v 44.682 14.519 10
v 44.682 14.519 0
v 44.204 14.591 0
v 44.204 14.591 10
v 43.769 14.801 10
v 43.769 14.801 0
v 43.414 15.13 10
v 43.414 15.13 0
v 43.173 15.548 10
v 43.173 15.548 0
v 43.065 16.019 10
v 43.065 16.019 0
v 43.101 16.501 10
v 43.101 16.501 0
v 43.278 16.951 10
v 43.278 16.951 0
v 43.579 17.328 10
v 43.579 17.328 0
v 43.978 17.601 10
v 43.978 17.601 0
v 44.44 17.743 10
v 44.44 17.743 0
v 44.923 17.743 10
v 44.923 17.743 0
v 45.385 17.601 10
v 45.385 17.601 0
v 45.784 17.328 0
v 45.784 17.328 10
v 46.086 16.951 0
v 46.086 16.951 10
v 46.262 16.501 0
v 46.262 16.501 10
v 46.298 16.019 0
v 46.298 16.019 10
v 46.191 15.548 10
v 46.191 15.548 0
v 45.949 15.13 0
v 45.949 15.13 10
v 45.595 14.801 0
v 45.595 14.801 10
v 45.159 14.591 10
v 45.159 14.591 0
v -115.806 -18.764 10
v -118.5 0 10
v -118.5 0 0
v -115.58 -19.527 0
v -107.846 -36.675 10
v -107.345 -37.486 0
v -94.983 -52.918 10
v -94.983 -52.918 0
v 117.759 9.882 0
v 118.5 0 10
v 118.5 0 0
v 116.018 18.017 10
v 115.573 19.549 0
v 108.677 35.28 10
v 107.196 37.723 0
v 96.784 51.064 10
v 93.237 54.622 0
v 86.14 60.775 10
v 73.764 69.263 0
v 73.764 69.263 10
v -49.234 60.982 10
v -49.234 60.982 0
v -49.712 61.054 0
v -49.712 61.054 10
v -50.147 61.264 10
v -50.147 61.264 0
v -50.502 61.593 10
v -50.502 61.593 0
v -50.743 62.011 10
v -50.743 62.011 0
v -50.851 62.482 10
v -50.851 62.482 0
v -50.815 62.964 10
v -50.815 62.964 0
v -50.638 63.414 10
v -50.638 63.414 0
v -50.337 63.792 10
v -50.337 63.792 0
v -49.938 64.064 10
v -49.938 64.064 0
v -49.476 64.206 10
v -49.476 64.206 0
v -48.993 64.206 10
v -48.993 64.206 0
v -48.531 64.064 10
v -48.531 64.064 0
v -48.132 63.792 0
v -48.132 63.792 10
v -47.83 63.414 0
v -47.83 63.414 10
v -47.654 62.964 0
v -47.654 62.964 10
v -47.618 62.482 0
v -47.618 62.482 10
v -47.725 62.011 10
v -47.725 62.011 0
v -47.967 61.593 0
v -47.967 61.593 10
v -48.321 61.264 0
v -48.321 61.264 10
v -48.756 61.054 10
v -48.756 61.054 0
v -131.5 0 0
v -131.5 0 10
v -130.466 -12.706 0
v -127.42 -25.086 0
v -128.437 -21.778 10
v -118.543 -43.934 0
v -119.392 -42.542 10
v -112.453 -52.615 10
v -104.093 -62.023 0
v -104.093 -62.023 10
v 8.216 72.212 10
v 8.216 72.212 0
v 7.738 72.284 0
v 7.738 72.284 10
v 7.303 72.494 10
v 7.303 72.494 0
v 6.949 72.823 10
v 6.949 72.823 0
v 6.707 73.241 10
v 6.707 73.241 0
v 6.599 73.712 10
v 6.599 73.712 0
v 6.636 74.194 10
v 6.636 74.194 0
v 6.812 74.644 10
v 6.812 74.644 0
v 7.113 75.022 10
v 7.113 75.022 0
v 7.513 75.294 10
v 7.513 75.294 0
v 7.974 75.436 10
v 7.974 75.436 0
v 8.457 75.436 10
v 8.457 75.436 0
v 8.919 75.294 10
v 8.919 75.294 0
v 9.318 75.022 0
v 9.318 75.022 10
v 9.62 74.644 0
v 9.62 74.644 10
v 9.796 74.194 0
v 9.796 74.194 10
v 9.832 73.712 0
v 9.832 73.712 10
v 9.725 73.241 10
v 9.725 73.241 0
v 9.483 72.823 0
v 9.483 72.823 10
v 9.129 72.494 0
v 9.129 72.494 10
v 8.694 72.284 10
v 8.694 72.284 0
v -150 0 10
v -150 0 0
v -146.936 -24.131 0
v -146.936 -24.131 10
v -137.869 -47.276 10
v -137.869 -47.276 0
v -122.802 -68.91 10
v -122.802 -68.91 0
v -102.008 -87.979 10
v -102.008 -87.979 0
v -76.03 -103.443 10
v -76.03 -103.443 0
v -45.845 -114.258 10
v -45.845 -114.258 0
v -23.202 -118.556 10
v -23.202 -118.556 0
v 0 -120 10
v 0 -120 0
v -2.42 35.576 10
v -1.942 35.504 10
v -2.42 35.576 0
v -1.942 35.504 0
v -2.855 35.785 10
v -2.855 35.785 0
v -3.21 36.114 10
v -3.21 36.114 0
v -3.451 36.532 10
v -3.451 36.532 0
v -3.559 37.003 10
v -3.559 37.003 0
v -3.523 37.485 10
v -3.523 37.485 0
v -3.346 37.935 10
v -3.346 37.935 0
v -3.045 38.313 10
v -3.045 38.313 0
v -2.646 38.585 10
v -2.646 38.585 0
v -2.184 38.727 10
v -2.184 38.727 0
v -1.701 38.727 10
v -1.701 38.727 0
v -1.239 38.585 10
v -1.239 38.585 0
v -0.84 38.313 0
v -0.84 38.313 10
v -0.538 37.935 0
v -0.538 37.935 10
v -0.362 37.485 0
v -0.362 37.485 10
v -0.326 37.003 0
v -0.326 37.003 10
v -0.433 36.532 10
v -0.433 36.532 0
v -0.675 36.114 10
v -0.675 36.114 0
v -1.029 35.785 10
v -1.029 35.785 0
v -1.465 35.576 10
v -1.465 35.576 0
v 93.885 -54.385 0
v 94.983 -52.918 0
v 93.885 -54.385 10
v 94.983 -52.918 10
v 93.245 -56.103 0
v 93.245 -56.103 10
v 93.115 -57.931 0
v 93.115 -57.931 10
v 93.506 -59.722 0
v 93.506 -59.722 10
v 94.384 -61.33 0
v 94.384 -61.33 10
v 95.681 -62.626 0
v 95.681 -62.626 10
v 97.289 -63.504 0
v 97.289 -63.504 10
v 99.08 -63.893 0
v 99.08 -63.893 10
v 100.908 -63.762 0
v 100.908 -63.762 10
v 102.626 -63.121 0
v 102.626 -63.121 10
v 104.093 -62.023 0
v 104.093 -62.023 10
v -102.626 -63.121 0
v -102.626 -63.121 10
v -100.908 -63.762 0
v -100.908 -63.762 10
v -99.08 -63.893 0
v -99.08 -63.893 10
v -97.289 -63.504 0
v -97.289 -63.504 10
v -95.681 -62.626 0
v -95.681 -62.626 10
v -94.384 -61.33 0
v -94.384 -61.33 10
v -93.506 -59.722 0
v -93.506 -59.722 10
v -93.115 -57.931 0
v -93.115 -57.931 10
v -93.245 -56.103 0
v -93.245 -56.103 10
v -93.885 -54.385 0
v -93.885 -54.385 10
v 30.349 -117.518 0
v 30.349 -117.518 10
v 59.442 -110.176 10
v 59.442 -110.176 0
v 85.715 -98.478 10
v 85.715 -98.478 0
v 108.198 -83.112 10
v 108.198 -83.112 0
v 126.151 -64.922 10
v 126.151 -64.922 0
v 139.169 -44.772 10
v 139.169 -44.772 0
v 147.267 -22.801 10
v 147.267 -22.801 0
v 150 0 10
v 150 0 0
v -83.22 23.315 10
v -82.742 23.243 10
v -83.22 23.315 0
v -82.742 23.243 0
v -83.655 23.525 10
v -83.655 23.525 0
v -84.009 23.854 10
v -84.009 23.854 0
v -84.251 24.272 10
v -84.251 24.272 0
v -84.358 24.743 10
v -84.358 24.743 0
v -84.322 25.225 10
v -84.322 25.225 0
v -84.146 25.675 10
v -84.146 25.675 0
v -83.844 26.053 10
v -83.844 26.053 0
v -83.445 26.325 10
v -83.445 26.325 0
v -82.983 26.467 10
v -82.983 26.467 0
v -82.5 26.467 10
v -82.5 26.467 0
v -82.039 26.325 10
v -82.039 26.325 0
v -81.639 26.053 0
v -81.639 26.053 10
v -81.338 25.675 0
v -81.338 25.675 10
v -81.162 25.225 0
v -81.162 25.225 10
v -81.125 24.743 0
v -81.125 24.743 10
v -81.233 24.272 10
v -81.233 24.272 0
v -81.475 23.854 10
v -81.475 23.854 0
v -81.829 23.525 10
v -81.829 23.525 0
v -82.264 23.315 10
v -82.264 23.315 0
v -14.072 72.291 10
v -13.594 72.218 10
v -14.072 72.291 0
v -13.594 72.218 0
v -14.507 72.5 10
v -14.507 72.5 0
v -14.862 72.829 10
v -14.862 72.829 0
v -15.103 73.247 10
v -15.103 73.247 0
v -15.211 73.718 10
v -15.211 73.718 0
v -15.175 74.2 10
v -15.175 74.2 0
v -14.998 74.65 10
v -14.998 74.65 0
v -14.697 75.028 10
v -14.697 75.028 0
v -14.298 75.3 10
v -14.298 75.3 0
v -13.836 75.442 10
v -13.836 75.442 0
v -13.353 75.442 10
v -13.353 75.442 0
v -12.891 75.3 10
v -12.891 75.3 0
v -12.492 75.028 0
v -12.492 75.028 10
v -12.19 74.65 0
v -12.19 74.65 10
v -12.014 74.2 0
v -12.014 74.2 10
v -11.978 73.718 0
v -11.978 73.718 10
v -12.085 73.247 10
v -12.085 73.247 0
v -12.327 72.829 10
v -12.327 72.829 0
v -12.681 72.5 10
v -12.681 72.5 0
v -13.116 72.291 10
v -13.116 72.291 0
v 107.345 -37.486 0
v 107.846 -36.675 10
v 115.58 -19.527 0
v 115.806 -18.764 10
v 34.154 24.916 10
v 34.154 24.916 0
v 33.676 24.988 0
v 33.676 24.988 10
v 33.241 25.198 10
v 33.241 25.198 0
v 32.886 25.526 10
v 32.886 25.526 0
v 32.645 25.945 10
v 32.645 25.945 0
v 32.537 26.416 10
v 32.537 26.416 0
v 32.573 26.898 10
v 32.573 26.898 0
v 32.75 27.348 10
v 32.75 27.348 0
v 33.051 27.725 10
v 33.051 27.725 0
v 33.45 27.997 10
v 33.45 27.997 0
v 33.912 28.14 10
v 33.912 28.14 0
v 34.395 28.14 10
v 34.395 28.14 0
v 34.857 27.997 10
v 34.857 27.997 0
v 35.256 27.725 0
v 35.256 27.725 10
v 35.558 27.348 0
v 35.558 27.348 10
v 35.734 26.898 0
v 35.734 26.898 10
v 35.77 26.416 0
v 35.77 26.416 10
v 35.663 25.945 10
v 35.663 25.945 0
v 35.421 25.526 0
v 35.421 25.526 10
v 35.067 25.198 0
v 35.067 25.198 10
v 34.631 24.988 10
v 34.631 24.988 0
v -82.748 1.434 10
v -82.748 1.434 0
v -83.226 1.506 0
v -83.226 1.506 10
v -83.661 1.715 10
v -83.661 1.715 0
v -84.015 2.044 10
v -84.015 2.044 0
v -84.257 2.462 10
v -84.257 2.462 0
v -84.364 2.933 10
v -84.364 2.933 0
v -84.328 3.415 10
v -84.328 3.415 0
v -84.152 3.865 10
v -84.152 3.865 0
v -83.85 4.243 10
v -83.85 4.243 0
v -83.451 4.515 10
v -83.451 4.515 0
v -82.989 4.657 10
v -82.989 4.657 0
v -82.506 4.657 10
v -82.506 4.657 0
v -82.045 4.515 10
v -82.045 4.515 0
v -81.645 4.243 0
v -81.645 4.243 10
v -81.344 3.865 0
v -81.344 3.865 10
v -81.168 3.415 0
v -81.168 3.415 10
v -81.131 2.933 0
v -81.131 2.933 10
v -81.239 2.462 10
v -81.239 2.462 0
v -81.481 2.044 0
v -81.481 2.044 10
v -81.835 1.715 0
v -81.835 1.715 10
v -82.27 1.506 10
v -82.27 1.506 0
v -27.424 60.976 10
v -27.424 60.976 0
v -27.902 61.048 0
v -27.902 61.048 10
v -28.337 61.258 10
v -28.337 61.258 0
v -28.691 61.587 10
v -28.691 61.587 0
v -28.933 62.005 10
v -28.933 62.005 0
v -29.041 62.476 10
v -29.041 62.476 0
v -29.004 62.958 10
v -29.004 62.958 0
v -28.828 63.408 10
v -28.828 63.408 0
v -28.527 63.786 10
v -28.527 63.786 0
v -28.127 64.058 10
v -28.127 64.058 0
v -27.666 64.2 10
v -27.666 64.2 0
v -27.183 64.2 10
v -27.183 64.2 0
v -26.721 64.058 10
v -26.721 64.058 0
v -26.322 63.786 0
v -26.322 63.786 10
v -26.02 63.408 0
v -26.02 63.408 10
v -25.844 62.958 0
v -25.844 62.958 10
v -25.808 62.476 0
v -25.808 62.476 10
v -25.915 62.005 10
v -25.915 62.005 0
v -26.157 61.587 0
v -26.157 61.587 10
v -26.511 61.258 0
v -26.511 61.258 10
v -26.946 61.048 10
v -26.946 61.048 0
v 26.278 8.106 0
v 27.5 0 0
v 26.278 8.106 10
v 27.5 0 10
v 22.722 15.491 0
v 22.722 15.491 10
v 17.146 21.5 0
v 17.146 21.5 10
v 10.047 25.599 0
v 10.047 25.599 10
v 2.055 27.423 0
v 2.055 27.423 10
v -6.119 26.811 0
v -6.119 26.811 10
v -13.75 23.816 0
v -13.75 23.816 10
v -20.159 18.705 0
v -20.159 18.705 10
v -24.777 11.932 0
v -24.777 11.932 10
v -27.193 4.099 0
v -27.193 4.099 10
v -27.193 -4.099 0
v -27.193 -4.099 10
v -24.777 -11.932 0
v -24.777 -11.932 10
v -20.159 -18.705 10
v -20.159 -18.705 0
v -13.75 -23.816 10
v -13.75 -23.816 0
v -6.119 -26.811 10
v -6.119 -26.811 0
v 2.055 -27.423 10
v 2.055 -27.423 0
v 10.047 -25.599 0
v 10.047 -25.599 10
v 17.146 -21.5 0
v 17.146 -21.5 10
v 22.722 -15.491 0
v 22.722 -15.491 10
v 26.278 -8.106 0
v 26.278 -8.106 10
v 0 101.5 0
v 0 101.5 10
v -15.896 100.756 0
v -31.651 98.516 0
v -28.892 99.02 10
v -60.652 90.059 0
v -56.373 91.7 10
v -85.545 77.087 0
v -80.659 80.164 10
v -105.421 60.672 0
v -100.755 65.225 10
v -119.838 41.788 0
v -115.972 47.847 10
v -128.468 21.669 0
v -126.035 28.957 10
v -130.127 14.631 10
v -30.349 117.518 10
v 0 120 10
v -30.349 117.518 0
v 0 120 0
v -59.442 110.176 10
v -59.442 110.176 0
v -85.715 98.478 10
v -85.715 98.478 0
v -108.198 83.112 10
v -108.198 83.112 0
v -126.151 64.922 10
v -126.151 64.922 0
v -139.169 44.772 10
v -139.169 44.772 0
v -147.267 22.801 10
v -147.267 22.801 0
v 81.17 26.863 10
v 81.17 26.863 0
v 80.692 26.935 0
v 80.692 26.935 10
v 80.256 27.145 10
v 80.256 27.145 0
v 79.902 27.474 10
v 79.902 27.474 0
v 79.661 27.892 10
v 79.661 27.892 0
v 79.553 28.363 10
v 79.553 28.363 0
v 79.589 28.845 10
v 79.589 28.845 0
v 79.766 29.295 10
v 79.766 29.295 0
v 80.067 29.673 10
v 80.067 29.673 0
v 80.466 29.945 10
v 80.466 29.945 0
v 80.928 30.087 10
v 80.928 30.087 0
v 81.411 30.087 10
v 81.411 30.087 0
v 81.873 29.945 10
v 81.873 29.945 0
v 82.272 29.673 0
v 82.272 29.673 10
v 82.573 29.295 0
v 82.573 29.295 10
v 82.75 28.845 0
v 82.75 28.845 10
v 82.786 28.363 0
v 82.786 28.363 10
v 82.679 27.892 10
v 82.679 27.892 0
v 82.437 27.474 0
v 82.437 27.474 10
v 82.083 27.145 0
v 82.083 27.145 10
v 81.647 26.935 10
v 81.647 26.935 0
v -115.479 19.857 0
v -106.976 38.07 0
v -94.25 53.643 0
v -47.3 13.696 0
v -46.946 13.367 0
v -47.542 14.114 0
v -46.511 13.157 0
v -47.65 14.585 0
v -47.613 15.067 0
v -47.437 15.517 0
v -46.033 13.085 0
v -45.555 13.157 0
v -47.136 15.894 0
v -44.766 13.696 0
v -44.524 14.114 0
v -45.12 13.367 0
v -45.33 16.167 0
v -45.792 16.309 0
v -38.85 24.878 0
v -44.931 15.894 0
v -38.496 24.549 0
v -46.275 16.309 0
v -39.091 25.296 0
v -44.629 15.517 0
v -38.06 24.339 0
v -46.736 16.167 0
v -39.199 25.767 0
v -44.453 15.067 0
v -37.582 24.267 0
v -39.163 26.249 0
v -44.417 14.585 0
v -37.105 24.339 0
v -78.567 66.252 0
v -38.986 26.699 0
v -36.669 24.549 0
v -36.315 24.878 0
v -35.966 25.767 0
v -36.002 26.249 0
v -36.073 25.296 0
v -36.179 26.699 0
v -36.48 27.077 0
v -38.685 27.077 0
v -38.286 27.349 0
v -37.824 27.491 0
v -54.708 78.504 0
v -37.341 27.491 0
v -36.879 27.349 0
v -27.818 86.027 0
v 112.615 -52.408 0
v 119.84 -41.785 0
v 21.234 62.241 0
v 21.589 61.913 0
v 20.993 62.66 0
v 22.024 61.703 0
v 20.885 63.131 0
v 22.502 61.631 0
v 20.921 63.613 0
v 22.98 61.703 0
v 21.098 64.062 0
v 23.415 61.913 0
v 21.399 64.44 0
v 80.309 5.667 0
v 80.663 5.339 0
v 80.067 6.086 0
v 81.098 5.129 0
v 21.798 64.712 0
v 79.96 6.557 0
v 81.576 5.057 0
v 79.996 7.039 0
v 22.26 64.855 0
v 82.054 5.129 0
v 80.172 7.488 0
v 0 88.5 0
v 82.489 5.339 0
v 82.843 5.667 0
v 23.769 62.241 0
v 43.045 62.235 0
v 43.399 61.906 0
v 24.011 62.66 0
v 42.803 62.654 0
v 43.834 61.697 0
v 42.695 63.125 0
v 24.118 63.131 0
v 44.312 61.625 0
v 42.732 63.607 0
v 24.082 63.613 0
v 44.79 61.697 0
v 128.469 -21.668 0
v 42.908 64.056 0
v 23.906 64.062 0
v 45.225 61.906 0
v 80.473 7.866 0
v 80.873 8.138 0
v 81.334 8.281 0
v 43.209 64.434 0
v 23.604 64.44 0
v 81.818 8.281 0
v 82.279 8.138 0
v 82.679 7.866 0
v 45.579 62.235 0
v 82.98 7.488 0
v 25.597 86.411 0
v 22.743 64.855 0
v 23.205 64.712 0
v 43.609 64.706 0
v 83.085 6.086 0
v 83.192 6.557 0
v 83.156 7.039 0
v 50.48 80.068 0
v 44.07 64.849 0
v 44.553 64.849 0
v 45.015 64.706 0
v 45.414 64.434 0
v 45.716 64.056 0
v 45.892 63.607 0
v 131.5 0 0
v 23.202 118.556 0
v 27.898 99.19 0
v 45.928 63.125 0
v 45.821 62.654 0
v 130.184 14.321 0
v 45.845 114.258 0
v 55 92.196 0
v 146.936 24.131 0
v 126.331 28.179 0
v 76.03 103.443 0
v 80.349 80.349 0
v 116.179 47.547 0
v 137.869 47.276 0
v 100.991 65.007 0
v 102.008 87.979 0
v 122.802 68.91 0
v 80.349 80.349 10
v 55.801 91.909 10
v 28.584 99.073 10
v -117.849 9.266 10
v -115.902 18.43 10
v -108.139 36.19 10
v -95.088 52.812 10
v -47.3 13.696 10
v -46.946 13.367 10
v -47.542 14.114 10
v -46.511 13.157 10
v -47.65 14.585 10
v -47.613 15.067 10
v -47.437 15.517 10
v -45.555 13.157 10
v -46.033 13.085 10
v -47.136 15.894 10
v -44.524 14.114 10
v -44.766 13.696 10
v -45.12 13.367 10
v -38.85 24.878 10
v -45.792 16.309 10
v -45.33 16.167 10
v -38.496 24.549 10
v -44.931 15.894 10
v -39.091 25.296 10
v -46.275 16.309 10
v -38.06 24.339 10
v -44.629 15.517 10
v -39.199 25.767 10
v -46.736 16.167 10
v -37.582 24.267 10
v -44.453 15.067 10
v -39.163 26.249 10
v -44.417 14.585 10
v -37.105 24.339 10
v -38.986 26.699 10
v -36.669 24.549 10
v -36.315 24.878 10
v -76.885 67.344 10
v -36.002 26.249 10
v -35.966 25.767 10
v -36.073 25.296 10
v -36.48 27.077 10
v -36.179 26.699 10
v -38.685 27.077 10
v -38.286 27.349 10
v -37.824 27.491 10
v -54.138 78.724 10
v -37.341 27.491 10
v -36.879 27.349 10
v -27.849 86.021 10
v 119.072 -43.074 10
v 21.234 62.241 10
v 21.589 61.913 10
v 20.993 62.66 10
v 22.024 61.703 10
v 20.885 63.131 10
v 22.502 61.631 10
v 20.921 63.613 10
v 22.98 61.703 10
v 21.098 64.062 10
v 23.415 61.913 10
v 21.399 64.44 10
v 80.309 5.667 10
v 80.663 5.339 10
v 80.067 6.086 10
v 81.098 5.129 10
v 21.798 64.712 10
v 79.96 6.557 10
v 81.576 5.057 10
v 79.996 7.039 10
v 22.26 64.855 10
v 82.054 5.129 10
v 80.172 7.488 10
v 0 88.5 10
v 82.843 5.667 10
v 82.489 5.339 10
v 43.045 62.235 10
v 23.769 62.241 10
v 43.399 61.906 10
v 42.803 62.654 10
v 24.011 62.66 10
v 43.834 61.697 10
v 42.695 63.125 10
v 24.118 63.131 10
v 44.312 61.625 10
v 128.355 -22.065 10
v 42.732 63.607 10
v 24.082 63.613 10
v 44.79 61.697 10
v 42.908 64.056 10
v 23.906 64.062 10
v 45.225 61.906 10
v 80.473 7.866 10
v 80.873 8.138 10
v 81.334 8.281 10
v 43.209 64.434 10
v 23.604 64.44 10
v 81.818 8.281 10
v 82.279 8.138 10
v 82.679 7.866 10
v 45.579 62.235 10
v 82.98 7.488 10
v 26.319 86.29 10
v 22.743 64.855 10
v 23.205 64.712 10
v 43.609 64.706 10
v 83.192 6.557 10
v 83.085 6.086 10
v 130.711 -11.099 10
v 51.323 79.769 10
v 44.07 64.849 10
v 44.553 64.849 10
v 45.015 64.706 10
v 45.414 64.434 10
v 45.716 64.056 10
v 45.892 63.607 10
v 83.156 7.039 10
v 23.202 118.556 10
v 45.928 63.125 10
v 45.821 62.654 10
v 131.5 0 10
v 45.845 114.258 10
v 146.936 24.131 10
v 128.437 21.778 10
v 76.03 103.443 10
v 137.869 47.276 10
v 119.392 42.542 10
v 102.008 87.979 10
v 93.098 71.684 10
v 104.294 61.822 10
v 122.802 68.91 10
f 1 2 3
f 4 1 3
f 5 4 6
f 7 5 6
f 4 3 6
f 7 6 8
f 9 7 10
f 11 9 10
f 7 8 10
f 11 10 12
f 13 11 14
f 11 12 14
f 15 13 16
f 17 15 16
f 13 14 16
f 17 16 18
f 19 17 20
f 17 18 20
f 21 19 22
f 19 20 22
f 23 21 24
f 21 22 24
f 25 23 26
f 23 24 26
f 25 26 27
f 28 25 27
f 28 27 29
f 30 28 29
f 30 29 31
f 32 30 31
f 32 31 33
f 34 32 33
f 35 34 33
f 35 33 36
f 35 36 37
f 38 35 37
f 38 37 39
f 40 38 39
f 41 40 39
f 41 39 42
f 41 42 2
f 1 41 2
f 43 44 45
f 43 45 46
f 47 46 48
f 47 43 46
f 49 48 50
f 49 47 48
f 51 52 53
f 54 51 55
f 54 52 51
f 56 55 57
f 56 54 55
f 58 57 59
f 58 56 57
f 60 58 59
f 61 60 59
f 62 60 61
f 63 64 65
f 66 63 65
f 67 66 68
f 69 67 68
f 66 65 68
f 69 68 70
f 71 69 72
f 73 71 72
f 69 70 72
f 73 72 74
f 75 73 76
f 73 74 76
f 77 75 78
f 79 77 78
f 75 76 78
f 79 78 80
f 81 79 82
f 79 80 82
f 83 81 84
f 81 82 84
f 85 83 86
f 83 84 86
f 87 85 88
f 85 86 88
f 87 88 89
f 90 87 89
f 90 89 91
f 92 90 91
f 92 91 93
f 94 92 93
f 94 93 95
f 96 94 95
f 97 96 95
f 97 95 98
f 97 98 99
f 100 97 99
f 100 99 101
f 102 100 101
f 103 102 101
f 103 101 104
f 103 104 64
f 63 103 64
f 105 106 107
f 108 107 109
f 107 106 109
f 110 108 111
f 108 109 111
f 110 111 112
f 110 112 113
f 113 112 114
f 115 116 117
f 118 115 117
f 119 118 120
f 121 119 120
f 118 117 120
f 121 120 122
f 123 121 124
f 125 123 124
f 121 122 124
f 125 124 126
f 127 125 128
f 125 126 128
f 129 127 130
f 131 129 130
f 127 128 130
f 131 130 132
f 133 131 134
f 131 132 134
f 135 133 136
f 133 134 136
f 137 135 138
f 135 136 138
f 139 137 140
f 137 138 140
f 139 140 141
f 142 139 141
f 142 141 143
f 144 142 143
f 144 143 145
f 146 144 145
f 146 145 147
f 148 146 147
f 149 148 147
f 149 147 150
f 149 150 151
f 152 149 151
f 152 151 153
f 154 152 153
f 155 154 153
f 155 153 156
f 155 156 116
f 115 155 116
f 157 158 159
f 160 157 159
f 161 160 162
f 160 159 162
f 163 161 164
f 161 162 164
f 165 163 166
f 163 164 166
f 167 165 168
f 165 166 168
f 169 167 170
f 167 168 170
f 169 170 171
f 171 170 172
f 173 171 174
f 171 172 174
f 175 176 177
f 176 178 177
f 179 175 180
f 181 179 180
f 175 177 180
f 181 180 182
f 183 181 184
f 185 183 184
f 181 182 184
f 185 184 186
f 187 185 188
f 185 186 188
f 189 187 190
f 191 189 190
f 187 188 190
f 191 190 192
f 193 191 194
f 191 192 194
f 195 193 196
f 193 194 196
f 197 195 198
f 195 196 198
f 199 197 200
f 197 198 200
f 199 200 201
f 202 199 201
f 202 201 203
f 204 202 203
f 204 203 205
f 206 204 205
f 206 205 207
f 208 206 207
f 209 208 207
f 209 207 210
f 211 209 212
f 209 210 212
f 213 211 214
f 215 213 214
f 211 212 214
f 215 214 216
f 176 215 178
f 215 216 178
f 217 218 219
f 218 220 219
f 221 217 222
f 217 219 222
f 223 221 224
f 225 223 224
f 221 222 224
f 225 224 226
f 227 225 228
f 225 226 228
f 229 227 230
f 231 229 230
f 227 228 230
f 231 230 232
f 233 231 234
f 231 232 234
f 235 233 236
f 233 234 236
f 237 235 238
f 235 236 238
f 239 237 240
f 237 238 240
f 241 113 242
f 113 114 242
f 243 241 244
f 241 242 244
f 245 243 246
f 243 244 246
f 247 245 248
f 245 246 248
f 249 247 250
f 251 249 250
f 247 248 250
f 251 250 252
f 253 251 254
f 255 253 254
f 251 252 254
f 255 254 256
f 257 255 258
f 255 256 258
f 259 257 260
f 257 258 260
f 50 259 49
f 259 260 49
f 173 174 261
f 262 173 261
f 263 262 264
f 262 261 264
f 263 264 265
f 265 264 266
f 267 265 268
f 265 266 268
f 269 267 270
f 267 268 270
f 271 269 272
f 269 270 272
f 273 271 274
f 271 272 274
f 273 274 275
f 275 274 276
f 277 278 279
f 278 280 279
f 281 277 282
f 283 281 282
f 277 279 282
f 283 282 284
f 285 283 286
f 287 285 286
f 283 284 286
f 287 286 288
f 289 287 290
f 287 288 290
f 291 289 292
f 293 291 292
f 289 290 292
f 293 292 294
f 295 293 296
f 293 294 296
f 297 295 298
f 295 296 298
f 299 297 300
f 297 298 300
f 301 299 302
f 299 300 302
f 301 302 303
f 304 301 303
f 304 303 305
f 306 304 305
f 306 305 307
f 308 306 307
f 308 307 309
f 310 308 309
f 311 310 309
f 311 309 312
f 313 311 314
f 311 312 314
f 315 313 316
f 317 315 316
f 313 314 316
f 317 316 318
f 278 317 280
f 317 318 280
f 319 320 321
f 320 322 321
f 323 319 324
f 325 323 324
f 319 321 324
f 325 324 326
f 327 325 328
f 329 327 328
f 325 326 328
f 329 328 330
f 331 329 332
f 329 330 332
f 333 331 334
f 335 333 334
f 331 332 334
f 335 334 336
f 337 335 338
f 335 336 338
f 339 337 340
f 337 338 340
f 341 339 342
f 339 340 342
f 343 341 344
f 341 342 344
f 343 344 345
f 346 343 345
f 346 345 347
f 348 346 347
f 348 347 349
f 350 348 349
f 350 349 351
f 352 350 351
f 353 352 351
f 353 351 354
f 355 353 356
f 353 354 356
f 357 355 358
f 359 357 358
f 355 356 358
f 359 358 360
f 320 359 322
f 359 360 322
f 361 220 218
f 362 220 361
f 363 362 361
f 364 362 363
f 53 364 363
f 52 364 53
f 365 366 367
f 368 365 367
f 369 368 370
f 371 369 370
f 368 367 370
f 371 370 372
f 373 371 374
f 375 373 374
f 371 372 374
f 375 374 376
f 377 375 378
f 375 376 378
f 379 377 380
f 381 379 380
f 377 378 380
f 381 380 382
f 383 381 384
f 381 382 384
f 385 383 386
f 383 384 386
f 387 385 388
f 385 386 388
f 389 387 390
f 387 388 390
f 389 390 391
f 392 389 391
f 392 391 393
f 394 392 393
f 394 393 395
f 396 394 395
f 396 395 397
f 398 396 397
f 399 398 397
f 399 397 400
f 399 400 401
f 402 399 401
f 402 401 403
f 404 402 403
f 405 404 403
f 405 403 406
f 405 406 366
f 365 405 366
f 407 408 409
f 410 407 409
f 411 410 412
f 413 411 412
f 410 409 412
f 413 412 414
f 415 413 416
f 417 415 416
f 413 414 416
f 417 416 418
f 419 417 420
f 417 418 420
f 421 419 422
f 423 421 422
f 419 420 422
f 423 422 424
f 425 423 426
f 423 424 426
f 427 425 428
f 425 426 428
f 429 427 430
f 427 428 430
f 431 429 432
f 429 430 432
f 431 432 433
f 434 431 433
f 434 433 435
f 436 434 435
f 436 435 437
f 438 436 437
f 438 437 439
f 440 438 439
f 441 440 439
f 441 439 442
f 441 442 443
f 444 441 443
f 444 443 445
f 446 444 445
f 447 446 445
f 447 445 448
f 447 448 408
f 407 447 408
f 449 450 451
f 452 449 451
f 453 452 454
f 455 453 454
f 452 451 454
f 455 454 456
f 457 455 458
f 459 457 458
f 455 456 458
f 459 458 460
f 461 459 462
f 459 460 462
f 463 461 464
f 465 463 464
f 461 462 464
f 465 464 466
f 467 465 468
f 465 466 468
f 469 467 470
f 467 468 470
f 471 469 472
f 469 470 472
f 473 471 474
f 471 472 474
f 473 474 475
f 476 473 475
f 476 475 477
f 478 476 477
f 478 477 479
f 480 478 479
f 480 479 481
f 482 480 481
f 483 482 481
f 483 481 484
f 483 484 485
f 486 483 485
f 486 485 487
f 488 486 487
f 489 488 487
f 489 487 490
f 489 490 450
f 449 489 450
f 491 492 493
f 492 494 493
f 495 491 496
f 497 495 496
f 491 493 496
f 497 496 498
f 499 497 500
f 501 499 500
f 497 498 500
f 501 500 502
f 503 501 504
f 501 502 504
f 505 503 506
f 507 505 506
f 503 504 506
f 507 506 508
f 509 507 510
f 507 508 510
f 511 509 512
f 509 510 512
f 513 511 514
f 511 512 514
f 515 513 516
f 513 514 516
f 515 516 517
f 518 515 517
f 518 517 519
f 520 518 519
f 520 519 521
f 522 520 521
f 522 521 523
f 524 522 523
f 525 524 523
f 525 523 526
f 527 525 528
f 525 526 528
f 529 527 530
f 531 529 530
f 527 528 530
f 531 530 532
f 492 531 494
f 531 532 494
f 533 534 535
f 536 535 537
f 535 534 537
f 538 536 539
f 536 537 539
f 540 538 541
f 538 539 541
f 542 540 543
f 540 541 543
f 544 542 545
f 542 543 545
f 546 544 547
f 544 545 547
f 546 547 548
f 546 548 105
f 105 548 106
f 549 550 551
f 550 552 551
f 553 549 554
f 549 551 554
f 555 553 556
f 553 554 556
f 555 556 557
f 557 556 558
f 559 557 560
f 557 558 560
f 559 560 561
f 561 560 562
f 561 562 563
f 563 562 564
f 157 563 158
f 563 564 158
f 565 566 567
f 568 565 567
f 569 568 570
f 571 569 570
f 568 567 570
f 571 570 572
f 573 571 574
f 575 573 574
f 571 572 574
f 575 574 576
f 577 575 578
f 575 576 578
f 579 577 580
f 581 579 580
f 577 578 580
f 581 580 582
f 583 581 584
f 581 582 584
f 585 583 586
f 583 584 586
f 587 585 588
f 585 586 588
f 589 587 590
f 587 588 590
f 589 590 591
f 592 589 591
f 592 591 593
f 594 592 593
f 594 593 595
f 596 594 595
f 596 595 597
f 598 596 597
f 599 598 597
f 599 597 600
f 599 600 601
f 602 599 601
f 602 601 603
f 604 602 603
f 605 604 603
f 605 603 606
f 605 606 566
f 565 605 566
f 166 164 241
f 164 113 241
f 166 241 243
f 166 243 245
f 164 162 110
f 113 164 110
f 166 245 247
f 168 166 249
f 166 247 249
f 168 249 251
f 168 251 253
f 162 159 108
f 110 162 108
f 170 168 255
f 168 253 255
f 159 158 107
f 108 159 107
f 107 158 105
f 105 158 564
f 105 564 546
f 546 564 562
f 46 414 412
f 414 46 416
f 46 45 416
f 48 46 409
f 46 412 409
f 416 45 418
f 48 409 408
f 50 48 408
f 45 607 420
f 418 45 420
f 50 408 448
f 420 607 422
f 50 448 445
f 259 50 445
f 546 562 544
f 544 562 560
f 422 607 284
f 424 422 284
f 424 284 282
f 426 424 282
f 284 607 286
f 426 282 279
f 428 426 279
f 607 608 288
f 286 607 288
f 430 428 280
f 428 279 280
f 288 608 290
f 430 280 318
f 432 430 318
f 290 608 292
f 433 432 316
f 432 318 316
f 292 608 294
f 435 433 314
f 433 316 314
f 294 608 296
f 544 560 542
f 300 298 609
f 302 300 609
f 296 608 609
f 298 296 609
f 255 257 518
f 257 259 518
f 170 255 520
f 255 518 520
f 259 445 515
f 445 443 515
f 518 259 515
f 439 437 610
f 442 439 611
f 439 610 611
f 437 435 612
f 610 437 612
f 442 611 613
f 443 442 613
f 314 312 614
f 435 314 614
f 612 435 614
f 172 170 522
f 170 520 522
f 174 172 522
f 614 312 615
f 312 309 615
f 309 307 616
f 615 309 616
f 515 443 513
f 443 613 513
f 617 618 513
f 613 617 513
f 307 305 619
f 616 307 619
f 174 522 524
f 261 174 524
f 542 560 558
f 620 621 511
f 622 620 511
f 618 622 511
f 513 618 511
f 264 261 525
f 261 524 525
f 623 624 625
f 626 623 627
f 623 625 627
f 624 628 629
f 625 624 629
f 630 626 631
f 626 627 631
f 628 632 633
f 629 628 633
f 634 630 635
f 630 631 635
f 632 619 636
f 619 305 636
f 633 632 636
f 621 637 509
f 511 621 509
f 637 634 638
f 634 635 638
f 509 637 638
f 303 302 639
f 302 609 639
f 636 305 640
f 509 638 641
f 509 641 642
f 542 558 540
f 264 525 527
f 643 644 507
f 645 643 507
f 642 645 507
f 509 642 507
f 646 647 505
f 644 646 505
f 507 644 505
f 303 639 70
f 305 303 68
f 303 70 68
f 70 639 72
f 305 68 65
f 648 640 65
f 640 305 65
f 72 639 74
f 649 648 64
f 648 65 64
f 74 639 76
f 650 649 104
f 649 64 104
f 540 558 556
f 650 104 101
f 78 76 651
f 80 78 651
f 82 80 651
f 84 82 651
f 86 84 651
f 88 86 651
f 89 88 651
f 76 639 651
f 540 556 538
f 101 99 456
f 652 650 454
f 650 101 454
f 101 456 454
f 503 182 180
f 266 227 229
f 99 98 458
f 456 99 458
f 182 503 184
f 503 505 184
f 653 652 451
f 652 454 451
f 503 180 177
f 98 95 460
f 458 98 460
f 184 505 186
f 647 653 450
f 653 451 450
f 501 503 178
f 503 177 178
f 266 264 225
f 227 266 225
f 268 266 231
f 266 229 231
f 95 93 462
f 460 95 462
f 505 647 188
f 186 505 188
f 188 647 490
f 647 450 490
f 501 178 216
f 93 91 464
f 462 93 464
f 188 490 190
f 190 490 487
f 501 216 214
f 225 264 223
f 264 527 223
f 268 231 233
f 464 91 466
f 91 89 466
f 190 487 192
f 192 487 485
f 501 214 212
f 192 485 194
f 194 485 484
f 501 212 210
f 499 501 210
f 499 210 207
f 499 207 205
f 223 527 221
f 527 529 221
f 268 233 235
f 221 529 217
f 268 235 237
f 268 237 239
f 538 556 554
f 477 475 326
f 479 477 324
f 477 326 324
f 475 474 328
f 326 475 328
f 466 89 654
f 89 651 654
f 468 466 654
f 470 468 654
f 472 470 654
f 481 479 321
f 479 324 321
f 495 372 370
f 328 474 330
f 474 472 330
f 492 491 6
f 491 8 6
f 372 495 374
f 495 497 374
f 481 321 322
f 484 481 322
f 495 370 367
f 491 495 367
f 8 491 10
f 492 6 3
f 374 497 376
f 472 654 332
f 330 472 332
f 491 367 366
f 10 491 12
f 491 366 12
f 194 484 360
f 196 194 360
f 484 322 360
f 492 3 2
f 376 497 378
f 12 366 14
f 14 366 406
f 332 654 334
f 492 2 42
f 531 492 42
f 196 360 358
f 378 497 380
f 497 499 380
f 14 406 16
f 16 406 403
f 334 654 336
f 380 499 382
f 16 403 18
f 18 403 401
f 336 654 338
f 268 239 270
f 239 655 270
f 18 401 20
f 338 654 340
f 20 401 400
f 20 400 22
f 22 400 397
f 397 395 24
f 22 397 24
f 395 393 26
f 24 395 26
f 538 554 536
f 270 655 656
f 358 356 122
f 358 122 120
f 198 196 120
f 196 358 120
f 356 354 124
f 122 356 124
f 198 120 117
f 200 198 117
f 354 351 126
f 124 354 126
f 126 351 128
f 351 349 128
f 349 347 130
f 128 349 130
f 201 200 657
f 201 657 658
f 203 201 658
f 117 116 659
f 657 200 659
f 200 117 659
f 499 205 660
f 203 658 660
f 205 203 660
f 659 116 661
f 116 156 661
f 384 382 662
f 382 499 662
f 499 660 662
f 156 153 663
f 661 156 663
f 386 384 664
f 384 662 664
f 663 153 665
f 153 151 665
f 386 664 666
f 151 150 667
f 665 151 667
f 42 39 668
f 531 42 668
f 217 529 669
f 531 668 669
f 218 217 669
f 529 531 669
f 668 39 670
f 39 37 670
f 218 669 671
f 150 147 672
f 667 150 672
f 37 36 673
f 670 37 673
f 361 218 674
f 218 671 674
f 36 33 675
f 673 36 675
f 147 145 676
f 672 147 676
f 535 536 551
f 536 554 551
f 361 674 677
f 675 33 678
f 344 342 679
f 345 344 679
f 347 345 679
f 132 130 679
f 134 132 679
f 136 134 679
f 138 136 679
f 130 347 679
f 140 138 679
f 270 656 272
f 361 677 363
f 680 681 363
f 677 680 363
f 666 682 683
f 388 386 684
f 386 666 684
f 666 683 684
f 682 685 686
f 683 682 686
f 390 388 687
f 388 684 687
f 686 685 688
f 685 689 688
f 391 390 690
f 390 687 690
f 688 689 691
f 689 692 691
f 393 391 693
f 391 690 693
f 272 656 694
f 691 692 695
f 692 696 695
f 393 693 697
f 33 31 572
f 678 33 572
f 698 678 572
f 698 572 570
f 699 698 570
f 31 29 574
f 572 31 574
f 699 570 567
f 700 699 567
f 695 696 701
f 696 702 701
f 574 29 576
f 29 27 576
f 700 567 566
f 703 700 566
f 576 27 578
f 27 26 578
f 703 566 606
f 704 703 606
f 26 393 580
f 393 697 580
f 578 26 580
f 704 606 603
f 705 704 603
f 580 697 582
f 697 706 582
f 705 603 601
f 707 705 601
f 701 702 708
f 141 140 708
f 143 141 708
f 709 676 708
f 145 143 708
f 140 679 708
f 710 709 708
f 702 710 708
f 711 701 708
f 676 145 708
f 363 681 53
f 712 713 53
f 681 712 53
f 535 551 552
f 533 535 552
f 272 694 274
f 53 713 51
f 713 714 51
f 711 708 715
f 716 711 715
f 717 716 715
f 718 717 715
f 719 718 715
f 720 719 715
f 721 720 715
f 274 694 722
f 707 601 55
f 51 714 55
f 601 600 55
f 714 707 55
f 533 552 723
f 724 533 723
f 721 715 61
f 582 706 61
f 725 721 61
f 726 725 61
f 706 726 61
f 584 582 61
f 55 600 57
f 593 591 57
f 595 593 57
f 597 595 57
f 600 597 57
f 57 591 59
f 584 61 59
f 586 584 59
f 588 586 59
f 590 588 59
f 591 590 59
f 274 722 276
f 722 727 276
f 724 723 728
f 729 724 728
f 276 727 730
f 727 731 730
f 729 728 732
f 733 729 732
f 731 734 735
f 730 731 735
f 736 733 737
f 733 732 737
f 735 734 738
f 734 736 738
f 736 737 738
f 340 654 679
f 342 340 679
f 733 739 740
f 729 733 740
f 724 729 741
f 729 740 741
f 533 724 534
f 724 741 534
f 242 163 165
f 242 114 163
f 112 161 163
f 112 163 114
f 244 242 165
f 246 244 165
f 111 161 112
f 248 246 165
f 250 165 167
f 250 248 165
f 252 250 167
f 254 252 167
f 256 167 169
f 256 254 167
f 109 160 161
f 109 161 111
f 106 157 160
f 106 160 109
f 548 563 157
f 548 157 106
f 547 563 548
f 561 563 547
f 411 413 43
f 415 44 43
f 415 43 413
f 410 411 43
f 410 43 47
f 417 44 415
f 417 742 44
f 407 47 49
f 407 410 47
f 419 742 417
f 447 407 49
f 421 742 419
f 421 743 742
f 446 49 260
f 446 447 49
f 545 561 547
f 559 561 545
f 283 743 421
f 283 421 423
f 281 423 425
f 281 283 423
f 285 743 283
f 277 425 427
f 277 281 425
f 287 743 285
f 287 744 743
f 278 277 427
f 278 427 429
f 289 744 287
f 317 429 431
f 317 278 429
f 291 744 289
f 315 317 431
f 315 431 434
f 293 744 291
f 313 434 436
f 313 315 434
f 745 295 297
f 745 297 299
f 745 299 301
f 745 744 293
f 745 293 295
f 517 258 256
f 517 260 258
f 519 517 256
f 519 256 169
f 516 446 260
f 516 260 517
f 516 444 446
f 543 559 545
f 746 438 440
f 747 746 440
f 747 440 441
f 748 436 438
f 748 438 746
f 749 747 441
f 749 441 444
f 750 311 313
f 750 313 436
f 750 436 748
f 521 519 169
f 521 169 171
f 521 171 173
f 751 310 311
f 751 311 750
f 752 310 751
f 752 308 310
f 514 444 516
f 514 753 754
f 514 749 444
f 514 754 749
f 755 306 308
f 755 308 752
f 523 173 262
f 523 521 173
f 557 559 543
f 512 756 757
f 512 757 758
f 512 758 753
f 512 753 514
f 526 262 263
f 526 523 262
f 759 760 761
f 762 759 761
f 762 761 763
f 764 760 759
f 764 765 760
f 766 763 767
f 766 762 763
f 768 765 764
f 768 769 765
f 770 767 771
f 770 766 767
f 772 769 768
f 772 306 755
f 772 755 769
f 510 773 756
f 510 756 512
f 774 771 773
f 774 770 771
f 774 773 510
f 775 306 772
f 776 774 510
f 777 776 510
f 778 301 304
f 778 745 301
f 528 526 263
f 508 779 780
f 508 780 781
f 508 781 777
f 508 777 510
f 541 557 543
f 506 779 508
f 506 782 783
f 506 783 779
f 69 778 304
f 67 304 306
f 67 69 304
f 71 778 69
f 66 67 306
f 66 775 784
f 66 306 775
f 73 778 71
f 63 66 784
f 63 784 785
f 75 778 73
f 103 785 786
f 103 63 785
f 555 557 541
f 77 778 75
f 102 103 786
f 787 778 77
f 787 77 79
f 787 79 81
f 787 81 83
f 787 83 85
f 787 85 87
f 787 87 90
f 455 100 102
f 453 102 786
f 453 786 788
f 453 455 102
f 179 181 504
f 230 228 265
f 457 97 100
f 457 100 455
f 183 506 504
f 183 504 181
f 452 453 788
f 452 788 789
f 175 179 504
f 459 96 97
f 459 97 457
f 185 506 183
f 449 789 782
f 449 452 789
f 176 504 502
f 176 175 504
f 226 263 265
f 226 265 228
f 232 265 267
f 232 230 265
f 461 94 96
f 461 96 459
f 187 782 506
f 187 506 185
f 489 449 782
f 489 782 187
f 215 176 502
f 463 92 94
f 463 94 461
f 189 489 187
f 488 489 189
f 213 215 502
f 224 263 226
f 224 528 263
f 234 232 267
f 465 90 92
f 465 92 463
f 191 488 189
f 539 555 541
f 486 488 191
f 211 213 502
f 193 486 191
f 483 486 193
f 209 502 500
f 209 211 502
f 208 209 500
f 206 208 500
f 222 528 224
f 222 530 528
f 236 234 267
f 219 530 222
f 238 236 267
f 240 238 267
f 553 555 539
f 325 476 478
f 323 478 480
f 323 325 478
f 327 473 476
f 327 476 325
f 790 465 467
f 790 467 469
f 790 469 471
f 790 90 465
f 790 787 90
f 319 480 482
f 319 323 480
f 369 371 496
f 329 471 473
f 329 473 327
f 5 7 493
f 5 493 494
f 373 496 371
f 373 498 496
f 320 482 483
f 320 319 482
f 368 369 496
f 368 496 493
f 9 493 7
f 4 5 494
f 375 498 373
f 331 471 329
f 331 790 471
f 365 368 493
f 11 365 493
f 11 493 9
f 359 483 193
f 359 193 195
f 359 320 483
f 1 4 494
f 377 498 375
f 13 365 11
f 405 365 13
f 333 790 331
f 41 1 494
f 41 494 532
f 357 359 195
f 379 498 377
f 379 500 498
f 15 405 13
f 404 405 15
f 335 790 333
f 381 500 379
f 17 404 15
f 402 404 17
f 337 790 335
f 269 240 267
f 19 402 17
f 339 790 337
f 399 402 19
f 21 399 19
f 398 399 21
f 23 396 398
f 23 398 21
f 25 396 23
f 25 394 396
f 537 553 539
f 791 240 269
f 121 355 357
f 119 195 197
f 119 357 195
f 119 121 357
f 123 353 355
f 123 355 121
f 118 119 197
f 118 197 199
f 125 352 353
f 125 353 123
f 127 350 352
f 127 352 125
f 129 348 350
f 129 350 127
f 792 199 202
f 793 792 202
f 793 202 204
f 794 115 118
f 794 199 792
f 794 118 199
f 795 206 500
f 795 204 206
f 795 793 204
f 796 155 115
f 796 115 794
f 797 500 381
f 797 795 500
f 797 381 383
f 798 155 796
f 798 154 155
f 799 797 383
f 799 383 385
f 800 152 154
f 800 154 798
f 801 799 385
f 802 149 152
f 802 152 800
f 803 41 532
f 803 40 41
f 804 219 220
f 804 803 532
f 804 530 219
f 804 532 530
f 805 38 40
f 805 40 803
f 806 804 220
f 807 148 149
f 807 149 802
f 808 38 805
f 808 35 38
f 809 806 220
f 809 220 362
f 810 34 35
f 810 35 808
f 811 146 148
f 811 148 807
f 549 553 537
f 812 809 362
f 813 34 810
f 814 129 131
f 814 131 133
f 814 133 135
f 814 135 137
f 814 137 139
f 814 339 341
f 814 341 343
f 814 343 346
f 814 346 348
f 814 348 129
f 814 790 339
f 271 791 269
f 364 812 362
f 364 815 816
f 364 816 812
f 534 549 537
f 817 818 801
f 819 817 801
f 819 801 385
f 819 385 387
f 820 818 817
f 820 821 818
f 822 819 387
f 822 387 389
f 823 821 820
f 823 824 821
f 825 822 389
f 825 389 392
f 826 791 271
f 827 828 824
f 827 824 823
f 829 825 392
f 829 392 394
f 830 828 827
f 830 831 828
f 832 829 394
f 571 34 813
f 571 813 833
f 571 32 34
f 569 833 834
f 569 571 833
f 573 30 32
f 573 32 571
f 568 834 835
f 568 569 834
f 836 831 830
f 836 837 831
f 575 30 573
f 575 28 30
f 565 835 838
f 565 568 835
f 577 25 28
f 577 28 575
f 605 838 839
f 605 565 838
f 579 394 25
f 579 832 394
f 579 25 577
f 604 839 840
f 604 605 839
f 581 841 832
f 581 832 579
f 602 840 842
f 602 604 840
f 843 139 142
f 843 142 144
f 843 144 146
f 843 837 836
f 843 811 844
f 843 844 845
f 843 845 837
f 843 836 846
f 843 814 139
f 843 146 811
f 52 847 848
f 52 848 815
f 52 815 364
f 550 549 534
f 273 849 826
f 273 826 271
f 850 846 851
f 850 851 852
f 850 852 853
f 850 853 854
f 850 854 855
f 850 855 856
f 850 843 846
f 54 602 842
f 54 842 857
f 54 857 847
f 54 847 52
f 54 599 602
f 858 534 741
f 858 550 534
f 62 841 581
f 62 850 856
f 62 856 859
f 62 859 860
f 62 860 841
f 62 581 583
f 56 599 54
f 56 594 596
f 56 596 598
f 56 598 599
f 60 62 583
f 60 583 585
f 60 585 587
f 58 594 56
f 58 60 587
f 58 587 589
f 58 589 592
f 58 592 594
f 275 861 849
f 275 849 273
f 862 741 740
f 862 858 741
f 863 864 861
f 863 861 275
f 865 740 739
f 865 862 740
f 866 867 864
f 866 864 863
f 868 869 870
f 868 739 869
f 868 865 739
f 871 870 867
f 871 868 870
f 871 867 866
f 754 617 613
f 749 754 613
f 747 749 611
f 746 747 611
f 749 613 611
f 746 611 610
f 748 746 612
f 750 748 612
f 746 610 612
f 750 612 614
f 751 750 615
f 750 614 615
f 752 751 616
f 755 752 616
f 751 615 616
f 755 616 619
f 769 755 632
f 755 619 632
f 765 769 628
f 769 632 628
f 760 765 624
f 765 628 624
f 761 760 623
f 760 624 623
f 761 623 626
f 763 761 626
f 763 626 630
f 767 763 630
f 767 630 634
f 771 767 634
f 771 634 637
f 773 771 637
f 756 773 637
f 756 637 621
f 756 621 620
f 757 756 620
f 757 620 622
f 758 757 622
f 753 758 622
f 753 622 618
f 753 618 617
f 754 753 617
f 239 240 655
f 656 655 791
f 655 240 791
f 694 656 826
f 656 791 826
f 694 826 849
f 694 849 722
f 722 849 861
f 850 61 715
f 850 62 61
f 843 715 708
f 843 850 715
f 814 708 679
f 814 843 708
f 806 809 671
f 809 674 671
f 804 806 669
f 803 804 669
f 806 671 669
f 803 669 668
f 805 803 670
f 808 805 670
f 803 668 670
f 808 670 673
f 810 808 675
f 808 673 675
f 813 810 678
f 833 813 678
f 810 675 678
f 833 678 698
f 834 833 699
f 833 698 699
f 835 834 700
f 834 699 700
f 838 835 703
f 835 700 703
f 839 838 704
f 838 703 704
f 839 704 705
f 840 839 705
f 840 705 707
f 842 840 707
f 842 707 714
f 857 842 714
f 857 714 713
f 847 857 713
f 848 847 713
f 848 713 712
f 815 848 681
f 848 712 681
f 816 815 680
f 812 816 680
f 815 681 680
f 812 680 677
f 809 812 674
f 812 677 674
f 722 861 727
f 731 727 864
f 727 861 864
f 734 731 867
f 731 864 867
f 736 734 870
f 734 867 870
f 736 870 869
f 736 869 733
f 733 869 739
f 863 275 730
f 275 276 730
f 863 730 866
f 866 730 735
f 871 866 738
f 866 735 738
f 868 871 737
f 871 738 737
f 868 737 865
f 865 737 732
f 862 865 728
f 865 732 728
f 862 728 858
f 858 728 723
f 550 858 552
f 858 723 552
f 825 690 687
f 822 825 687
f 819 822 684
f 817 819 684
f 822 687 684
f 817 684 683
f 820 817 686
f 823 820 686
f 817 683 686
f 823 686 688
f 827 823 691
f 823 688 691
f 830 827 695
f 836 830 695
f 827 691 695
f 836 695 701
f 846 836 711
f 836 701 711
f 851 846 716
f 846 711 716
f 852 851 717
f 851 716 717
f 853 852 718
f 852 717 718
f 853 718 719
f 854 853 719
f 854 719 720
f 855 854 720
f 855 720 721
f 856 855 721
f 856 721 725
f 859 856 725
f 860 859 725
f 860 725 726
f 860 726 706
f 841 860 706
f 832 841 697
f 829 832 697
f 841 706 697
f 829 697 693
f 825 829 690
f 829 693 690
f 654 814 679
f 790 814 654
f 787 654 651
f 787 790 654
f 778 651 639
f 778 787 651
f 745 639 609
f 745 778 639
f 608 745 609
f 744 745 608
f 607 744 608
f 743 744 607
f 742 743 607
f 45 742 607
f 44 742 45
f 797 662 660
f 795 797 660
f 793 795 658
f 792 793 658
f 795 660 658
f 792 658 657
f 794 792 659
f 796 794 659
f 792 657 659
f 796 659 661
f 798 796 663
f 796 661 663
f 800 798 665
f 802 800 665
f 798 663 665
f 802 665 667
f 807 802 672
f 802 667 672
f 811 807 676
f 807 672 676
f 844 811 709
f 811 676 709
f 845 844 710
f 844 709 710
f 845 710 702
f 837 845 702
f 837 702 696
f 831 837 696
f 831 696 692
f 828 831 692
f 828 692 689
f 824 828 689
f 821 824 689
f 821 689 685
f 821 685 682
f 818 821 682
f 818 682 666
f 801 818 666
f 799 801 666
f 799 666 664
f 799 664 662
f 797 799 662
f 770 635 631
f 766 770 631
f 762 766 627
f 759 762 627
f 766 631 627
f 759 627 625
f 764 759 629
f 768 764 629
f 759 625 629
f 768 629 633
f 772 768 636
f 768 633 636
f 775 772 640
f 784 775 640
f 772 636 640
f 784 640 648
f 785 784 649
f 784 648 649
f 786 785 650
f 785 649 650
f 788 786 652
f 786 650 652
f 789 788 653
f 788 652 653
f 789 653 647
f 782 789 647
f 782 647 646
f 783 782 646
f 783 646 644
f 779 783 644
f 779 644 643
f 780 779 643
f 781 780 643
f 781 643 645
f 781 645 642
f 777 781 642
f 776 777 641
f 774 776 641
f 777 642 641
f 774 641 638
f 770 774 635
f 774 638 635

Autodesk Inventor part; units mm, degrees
ref_plane "YZ Plane" through (0, 0, 0) normal (1, 0, 0) x (0, 1, 0)
ref_plane "XZ Plane" through (0, 0, 0) normal (0, 1, 0) x (-1, 0, 0)
ref_plane "XY Plane" through (0, 0, 0) normal (0, 0, 1) x (1, 0, 0)
sketch "Skizze1" plane through (0, 0, 0) normal (0, 0, 1) x (1, 0, 0)
  line L0 (-210, 0) -> (210, 0) projected
  line L1 (0, -168) -> (0, 168) projected
  ellipse E0 centre (0, 0) end of major axis (-150, 0) minor radius 120
  line L2 (0, 120) -> (0, -120) construction
  line L3 (-150, 0) -> (150, 0) construction
  dimension "d0" = 300
  dimension "d1" = 240
extrude "Extrusion1" add sketch "Skizze1" along normal blind 10
sketch "Skizze2" plane through (0, 0, 10) normal (0, 0, 1) x (1, 0, 0)
  ellipse E0 centre (0, 0) end of major axis (-150, 0) minor radius 120 projected
  line L0 (0, -168) -> (0, 168) projected
  line L1 (-210, 0) -> (210, 0) projected
  line L2 (-131.5, 0) -> (131.5, 0)
  line L3 (0, 101.5) -> (0, -101.5)
  ellipse E1 centre (0, 0) end of major axis (-131.5, 0) minor radius 101.5
  line L4 (0, 0) -> (-105.3012, -60.7957) construction
  line L5 (0, 0) -> (105.3012, -60.7957) construction
  ellipse E2 centre (0, 0) end of major axis (118.5, 0) minor radius 88.5
  line L6 (0, 0) -> (80.349, 80.349) construction
  line L7 (80.349, 80.349) -> (73.764, 69.2632)
  line L8 (67.3414, 73.0783) -> (84.3123, 62.9974)
  arc A0 (94.9826, -52.9176) -> (105.1165, -60.6891) centre (99.5391, -57.469) ccw
  arc A1 (-105.1165, -60.6891) -> (-94.9826, -52.9176) centre (-99.5391, -57.469) ccw
  point P0 (0, 120)
  point P1 (150, 0)
  point P2 (-150, 0)
  point P3 (0, -120)
  point P4 (118.5, 0)
  point P5 (-96, 0)
  point P6 (0, 88.5)
  point P7 (-104.0928, -62.0231)
  point P8 (104.0928, -62.0231)
  dimension "d7" = 18.5
  dimension "d8" = 18.5
  dimension "d9" = 31.5
  dimension "d10" = 31.5
  dimension "d11" = 45
  dimension "d12" = 90
  dimension "d13" = 12.8941
  dimension "d14" = 30
  dimension "d15" = 30
extrude "Extrusion2" cut sketch "Skizze2" against normal through all contours E1 L0 E2 L1 | L1 E2 A1 E1 | E1 L7 E2 L0 | E1 A0 E2 L1 | L1 E2 L7 E1
sketch "Skizze4" plane through (0, 0, 10) normal (0, 0, 1) x (1, 0, 0)
  circle A0 centre (0, 0) radius 27.5 projected
extrude "Extrusion4" cut sketch "Skizze4" against normal through all
sketch "Skizze5" plane through (0, 0, 10) normal (0, 0, 1) x (1, 0, 0)
  circle A0 centre (44.6817, 16.1402) radius 2.2 projected
  circle A1 centre (81.576, 6.678) radius 2.2 projected
  circle A2 centre (81.1696, 28.4843) radius 2.2 projected
  circle A3 centre (34.1537, 26.537) radius 2.2 projected
  circle A4 centre (-1.9423, 37.1246) radius 2.2 projected
  circle A5 centre (-37.5824, 25.8884) radius 2.2 projected
  circle A6 centre (-46.0331, 14.7062) radius 2.2 projected
  circle A7 centre (-82.7479, 3.0545) radius 2.1998 projected
  circle A8 centre (-82.7419, 24.8643) radius 2.1999 projected
  circle A9 centre (-49.2342, 62.6033) radius 2.2 projected
  circle A10 centre (-27.4241, 62.5973) radius 2.2 projected
  circle A11 centre (-13.5942, 73.8395) radius 2.2001 projected
  circle A12 centre (8.2159, 73.8333) radius 2.2 projected
  circle A13 centre (22.5018, 63.2519) radius 2.2 projected
  circle A14 centre (44.3119, 63.2458) radius 2.2 projected
  point P0 (0, 0)
hole "Bohrung1" at (81.576, 6.678, 10) at (81.1696, 28.4843, 10) at (44.6817, 16.1402, 10) at (34.1537, 26.537, 10) at (-1.9423, 37.1246, 10) at (8.2159, 73.8333, 10) at (-13.5942, 73.8395, 10) at (22.5018, 63.2519, 10) at (44.3119, 63.2458, 10) at (-27.4241, 62.5973, 10) at (-49.2342, 62.6033, 10) at (-37.5824, 25.8884, 10) at (-46.0331, 14.7062, 10) at (-82.7479, 3.0545, 10) at (-82.7419, 24.8643, 10) direction (0, 0, -1) diameter 3.242 end through all thread size "M4x0.7" class "6H" standard "ISO Metric profile"
sketch "Skizze6" plane through (0, 0, 0) normal (0, 0, -1) x (-1, 0, 0)
  point P0 (0, 0)
equation "\"d8\" = d7"
equation "\"d10\" = d9"
properties part number "24_0497_002" material "LCP-Kunststoff"
